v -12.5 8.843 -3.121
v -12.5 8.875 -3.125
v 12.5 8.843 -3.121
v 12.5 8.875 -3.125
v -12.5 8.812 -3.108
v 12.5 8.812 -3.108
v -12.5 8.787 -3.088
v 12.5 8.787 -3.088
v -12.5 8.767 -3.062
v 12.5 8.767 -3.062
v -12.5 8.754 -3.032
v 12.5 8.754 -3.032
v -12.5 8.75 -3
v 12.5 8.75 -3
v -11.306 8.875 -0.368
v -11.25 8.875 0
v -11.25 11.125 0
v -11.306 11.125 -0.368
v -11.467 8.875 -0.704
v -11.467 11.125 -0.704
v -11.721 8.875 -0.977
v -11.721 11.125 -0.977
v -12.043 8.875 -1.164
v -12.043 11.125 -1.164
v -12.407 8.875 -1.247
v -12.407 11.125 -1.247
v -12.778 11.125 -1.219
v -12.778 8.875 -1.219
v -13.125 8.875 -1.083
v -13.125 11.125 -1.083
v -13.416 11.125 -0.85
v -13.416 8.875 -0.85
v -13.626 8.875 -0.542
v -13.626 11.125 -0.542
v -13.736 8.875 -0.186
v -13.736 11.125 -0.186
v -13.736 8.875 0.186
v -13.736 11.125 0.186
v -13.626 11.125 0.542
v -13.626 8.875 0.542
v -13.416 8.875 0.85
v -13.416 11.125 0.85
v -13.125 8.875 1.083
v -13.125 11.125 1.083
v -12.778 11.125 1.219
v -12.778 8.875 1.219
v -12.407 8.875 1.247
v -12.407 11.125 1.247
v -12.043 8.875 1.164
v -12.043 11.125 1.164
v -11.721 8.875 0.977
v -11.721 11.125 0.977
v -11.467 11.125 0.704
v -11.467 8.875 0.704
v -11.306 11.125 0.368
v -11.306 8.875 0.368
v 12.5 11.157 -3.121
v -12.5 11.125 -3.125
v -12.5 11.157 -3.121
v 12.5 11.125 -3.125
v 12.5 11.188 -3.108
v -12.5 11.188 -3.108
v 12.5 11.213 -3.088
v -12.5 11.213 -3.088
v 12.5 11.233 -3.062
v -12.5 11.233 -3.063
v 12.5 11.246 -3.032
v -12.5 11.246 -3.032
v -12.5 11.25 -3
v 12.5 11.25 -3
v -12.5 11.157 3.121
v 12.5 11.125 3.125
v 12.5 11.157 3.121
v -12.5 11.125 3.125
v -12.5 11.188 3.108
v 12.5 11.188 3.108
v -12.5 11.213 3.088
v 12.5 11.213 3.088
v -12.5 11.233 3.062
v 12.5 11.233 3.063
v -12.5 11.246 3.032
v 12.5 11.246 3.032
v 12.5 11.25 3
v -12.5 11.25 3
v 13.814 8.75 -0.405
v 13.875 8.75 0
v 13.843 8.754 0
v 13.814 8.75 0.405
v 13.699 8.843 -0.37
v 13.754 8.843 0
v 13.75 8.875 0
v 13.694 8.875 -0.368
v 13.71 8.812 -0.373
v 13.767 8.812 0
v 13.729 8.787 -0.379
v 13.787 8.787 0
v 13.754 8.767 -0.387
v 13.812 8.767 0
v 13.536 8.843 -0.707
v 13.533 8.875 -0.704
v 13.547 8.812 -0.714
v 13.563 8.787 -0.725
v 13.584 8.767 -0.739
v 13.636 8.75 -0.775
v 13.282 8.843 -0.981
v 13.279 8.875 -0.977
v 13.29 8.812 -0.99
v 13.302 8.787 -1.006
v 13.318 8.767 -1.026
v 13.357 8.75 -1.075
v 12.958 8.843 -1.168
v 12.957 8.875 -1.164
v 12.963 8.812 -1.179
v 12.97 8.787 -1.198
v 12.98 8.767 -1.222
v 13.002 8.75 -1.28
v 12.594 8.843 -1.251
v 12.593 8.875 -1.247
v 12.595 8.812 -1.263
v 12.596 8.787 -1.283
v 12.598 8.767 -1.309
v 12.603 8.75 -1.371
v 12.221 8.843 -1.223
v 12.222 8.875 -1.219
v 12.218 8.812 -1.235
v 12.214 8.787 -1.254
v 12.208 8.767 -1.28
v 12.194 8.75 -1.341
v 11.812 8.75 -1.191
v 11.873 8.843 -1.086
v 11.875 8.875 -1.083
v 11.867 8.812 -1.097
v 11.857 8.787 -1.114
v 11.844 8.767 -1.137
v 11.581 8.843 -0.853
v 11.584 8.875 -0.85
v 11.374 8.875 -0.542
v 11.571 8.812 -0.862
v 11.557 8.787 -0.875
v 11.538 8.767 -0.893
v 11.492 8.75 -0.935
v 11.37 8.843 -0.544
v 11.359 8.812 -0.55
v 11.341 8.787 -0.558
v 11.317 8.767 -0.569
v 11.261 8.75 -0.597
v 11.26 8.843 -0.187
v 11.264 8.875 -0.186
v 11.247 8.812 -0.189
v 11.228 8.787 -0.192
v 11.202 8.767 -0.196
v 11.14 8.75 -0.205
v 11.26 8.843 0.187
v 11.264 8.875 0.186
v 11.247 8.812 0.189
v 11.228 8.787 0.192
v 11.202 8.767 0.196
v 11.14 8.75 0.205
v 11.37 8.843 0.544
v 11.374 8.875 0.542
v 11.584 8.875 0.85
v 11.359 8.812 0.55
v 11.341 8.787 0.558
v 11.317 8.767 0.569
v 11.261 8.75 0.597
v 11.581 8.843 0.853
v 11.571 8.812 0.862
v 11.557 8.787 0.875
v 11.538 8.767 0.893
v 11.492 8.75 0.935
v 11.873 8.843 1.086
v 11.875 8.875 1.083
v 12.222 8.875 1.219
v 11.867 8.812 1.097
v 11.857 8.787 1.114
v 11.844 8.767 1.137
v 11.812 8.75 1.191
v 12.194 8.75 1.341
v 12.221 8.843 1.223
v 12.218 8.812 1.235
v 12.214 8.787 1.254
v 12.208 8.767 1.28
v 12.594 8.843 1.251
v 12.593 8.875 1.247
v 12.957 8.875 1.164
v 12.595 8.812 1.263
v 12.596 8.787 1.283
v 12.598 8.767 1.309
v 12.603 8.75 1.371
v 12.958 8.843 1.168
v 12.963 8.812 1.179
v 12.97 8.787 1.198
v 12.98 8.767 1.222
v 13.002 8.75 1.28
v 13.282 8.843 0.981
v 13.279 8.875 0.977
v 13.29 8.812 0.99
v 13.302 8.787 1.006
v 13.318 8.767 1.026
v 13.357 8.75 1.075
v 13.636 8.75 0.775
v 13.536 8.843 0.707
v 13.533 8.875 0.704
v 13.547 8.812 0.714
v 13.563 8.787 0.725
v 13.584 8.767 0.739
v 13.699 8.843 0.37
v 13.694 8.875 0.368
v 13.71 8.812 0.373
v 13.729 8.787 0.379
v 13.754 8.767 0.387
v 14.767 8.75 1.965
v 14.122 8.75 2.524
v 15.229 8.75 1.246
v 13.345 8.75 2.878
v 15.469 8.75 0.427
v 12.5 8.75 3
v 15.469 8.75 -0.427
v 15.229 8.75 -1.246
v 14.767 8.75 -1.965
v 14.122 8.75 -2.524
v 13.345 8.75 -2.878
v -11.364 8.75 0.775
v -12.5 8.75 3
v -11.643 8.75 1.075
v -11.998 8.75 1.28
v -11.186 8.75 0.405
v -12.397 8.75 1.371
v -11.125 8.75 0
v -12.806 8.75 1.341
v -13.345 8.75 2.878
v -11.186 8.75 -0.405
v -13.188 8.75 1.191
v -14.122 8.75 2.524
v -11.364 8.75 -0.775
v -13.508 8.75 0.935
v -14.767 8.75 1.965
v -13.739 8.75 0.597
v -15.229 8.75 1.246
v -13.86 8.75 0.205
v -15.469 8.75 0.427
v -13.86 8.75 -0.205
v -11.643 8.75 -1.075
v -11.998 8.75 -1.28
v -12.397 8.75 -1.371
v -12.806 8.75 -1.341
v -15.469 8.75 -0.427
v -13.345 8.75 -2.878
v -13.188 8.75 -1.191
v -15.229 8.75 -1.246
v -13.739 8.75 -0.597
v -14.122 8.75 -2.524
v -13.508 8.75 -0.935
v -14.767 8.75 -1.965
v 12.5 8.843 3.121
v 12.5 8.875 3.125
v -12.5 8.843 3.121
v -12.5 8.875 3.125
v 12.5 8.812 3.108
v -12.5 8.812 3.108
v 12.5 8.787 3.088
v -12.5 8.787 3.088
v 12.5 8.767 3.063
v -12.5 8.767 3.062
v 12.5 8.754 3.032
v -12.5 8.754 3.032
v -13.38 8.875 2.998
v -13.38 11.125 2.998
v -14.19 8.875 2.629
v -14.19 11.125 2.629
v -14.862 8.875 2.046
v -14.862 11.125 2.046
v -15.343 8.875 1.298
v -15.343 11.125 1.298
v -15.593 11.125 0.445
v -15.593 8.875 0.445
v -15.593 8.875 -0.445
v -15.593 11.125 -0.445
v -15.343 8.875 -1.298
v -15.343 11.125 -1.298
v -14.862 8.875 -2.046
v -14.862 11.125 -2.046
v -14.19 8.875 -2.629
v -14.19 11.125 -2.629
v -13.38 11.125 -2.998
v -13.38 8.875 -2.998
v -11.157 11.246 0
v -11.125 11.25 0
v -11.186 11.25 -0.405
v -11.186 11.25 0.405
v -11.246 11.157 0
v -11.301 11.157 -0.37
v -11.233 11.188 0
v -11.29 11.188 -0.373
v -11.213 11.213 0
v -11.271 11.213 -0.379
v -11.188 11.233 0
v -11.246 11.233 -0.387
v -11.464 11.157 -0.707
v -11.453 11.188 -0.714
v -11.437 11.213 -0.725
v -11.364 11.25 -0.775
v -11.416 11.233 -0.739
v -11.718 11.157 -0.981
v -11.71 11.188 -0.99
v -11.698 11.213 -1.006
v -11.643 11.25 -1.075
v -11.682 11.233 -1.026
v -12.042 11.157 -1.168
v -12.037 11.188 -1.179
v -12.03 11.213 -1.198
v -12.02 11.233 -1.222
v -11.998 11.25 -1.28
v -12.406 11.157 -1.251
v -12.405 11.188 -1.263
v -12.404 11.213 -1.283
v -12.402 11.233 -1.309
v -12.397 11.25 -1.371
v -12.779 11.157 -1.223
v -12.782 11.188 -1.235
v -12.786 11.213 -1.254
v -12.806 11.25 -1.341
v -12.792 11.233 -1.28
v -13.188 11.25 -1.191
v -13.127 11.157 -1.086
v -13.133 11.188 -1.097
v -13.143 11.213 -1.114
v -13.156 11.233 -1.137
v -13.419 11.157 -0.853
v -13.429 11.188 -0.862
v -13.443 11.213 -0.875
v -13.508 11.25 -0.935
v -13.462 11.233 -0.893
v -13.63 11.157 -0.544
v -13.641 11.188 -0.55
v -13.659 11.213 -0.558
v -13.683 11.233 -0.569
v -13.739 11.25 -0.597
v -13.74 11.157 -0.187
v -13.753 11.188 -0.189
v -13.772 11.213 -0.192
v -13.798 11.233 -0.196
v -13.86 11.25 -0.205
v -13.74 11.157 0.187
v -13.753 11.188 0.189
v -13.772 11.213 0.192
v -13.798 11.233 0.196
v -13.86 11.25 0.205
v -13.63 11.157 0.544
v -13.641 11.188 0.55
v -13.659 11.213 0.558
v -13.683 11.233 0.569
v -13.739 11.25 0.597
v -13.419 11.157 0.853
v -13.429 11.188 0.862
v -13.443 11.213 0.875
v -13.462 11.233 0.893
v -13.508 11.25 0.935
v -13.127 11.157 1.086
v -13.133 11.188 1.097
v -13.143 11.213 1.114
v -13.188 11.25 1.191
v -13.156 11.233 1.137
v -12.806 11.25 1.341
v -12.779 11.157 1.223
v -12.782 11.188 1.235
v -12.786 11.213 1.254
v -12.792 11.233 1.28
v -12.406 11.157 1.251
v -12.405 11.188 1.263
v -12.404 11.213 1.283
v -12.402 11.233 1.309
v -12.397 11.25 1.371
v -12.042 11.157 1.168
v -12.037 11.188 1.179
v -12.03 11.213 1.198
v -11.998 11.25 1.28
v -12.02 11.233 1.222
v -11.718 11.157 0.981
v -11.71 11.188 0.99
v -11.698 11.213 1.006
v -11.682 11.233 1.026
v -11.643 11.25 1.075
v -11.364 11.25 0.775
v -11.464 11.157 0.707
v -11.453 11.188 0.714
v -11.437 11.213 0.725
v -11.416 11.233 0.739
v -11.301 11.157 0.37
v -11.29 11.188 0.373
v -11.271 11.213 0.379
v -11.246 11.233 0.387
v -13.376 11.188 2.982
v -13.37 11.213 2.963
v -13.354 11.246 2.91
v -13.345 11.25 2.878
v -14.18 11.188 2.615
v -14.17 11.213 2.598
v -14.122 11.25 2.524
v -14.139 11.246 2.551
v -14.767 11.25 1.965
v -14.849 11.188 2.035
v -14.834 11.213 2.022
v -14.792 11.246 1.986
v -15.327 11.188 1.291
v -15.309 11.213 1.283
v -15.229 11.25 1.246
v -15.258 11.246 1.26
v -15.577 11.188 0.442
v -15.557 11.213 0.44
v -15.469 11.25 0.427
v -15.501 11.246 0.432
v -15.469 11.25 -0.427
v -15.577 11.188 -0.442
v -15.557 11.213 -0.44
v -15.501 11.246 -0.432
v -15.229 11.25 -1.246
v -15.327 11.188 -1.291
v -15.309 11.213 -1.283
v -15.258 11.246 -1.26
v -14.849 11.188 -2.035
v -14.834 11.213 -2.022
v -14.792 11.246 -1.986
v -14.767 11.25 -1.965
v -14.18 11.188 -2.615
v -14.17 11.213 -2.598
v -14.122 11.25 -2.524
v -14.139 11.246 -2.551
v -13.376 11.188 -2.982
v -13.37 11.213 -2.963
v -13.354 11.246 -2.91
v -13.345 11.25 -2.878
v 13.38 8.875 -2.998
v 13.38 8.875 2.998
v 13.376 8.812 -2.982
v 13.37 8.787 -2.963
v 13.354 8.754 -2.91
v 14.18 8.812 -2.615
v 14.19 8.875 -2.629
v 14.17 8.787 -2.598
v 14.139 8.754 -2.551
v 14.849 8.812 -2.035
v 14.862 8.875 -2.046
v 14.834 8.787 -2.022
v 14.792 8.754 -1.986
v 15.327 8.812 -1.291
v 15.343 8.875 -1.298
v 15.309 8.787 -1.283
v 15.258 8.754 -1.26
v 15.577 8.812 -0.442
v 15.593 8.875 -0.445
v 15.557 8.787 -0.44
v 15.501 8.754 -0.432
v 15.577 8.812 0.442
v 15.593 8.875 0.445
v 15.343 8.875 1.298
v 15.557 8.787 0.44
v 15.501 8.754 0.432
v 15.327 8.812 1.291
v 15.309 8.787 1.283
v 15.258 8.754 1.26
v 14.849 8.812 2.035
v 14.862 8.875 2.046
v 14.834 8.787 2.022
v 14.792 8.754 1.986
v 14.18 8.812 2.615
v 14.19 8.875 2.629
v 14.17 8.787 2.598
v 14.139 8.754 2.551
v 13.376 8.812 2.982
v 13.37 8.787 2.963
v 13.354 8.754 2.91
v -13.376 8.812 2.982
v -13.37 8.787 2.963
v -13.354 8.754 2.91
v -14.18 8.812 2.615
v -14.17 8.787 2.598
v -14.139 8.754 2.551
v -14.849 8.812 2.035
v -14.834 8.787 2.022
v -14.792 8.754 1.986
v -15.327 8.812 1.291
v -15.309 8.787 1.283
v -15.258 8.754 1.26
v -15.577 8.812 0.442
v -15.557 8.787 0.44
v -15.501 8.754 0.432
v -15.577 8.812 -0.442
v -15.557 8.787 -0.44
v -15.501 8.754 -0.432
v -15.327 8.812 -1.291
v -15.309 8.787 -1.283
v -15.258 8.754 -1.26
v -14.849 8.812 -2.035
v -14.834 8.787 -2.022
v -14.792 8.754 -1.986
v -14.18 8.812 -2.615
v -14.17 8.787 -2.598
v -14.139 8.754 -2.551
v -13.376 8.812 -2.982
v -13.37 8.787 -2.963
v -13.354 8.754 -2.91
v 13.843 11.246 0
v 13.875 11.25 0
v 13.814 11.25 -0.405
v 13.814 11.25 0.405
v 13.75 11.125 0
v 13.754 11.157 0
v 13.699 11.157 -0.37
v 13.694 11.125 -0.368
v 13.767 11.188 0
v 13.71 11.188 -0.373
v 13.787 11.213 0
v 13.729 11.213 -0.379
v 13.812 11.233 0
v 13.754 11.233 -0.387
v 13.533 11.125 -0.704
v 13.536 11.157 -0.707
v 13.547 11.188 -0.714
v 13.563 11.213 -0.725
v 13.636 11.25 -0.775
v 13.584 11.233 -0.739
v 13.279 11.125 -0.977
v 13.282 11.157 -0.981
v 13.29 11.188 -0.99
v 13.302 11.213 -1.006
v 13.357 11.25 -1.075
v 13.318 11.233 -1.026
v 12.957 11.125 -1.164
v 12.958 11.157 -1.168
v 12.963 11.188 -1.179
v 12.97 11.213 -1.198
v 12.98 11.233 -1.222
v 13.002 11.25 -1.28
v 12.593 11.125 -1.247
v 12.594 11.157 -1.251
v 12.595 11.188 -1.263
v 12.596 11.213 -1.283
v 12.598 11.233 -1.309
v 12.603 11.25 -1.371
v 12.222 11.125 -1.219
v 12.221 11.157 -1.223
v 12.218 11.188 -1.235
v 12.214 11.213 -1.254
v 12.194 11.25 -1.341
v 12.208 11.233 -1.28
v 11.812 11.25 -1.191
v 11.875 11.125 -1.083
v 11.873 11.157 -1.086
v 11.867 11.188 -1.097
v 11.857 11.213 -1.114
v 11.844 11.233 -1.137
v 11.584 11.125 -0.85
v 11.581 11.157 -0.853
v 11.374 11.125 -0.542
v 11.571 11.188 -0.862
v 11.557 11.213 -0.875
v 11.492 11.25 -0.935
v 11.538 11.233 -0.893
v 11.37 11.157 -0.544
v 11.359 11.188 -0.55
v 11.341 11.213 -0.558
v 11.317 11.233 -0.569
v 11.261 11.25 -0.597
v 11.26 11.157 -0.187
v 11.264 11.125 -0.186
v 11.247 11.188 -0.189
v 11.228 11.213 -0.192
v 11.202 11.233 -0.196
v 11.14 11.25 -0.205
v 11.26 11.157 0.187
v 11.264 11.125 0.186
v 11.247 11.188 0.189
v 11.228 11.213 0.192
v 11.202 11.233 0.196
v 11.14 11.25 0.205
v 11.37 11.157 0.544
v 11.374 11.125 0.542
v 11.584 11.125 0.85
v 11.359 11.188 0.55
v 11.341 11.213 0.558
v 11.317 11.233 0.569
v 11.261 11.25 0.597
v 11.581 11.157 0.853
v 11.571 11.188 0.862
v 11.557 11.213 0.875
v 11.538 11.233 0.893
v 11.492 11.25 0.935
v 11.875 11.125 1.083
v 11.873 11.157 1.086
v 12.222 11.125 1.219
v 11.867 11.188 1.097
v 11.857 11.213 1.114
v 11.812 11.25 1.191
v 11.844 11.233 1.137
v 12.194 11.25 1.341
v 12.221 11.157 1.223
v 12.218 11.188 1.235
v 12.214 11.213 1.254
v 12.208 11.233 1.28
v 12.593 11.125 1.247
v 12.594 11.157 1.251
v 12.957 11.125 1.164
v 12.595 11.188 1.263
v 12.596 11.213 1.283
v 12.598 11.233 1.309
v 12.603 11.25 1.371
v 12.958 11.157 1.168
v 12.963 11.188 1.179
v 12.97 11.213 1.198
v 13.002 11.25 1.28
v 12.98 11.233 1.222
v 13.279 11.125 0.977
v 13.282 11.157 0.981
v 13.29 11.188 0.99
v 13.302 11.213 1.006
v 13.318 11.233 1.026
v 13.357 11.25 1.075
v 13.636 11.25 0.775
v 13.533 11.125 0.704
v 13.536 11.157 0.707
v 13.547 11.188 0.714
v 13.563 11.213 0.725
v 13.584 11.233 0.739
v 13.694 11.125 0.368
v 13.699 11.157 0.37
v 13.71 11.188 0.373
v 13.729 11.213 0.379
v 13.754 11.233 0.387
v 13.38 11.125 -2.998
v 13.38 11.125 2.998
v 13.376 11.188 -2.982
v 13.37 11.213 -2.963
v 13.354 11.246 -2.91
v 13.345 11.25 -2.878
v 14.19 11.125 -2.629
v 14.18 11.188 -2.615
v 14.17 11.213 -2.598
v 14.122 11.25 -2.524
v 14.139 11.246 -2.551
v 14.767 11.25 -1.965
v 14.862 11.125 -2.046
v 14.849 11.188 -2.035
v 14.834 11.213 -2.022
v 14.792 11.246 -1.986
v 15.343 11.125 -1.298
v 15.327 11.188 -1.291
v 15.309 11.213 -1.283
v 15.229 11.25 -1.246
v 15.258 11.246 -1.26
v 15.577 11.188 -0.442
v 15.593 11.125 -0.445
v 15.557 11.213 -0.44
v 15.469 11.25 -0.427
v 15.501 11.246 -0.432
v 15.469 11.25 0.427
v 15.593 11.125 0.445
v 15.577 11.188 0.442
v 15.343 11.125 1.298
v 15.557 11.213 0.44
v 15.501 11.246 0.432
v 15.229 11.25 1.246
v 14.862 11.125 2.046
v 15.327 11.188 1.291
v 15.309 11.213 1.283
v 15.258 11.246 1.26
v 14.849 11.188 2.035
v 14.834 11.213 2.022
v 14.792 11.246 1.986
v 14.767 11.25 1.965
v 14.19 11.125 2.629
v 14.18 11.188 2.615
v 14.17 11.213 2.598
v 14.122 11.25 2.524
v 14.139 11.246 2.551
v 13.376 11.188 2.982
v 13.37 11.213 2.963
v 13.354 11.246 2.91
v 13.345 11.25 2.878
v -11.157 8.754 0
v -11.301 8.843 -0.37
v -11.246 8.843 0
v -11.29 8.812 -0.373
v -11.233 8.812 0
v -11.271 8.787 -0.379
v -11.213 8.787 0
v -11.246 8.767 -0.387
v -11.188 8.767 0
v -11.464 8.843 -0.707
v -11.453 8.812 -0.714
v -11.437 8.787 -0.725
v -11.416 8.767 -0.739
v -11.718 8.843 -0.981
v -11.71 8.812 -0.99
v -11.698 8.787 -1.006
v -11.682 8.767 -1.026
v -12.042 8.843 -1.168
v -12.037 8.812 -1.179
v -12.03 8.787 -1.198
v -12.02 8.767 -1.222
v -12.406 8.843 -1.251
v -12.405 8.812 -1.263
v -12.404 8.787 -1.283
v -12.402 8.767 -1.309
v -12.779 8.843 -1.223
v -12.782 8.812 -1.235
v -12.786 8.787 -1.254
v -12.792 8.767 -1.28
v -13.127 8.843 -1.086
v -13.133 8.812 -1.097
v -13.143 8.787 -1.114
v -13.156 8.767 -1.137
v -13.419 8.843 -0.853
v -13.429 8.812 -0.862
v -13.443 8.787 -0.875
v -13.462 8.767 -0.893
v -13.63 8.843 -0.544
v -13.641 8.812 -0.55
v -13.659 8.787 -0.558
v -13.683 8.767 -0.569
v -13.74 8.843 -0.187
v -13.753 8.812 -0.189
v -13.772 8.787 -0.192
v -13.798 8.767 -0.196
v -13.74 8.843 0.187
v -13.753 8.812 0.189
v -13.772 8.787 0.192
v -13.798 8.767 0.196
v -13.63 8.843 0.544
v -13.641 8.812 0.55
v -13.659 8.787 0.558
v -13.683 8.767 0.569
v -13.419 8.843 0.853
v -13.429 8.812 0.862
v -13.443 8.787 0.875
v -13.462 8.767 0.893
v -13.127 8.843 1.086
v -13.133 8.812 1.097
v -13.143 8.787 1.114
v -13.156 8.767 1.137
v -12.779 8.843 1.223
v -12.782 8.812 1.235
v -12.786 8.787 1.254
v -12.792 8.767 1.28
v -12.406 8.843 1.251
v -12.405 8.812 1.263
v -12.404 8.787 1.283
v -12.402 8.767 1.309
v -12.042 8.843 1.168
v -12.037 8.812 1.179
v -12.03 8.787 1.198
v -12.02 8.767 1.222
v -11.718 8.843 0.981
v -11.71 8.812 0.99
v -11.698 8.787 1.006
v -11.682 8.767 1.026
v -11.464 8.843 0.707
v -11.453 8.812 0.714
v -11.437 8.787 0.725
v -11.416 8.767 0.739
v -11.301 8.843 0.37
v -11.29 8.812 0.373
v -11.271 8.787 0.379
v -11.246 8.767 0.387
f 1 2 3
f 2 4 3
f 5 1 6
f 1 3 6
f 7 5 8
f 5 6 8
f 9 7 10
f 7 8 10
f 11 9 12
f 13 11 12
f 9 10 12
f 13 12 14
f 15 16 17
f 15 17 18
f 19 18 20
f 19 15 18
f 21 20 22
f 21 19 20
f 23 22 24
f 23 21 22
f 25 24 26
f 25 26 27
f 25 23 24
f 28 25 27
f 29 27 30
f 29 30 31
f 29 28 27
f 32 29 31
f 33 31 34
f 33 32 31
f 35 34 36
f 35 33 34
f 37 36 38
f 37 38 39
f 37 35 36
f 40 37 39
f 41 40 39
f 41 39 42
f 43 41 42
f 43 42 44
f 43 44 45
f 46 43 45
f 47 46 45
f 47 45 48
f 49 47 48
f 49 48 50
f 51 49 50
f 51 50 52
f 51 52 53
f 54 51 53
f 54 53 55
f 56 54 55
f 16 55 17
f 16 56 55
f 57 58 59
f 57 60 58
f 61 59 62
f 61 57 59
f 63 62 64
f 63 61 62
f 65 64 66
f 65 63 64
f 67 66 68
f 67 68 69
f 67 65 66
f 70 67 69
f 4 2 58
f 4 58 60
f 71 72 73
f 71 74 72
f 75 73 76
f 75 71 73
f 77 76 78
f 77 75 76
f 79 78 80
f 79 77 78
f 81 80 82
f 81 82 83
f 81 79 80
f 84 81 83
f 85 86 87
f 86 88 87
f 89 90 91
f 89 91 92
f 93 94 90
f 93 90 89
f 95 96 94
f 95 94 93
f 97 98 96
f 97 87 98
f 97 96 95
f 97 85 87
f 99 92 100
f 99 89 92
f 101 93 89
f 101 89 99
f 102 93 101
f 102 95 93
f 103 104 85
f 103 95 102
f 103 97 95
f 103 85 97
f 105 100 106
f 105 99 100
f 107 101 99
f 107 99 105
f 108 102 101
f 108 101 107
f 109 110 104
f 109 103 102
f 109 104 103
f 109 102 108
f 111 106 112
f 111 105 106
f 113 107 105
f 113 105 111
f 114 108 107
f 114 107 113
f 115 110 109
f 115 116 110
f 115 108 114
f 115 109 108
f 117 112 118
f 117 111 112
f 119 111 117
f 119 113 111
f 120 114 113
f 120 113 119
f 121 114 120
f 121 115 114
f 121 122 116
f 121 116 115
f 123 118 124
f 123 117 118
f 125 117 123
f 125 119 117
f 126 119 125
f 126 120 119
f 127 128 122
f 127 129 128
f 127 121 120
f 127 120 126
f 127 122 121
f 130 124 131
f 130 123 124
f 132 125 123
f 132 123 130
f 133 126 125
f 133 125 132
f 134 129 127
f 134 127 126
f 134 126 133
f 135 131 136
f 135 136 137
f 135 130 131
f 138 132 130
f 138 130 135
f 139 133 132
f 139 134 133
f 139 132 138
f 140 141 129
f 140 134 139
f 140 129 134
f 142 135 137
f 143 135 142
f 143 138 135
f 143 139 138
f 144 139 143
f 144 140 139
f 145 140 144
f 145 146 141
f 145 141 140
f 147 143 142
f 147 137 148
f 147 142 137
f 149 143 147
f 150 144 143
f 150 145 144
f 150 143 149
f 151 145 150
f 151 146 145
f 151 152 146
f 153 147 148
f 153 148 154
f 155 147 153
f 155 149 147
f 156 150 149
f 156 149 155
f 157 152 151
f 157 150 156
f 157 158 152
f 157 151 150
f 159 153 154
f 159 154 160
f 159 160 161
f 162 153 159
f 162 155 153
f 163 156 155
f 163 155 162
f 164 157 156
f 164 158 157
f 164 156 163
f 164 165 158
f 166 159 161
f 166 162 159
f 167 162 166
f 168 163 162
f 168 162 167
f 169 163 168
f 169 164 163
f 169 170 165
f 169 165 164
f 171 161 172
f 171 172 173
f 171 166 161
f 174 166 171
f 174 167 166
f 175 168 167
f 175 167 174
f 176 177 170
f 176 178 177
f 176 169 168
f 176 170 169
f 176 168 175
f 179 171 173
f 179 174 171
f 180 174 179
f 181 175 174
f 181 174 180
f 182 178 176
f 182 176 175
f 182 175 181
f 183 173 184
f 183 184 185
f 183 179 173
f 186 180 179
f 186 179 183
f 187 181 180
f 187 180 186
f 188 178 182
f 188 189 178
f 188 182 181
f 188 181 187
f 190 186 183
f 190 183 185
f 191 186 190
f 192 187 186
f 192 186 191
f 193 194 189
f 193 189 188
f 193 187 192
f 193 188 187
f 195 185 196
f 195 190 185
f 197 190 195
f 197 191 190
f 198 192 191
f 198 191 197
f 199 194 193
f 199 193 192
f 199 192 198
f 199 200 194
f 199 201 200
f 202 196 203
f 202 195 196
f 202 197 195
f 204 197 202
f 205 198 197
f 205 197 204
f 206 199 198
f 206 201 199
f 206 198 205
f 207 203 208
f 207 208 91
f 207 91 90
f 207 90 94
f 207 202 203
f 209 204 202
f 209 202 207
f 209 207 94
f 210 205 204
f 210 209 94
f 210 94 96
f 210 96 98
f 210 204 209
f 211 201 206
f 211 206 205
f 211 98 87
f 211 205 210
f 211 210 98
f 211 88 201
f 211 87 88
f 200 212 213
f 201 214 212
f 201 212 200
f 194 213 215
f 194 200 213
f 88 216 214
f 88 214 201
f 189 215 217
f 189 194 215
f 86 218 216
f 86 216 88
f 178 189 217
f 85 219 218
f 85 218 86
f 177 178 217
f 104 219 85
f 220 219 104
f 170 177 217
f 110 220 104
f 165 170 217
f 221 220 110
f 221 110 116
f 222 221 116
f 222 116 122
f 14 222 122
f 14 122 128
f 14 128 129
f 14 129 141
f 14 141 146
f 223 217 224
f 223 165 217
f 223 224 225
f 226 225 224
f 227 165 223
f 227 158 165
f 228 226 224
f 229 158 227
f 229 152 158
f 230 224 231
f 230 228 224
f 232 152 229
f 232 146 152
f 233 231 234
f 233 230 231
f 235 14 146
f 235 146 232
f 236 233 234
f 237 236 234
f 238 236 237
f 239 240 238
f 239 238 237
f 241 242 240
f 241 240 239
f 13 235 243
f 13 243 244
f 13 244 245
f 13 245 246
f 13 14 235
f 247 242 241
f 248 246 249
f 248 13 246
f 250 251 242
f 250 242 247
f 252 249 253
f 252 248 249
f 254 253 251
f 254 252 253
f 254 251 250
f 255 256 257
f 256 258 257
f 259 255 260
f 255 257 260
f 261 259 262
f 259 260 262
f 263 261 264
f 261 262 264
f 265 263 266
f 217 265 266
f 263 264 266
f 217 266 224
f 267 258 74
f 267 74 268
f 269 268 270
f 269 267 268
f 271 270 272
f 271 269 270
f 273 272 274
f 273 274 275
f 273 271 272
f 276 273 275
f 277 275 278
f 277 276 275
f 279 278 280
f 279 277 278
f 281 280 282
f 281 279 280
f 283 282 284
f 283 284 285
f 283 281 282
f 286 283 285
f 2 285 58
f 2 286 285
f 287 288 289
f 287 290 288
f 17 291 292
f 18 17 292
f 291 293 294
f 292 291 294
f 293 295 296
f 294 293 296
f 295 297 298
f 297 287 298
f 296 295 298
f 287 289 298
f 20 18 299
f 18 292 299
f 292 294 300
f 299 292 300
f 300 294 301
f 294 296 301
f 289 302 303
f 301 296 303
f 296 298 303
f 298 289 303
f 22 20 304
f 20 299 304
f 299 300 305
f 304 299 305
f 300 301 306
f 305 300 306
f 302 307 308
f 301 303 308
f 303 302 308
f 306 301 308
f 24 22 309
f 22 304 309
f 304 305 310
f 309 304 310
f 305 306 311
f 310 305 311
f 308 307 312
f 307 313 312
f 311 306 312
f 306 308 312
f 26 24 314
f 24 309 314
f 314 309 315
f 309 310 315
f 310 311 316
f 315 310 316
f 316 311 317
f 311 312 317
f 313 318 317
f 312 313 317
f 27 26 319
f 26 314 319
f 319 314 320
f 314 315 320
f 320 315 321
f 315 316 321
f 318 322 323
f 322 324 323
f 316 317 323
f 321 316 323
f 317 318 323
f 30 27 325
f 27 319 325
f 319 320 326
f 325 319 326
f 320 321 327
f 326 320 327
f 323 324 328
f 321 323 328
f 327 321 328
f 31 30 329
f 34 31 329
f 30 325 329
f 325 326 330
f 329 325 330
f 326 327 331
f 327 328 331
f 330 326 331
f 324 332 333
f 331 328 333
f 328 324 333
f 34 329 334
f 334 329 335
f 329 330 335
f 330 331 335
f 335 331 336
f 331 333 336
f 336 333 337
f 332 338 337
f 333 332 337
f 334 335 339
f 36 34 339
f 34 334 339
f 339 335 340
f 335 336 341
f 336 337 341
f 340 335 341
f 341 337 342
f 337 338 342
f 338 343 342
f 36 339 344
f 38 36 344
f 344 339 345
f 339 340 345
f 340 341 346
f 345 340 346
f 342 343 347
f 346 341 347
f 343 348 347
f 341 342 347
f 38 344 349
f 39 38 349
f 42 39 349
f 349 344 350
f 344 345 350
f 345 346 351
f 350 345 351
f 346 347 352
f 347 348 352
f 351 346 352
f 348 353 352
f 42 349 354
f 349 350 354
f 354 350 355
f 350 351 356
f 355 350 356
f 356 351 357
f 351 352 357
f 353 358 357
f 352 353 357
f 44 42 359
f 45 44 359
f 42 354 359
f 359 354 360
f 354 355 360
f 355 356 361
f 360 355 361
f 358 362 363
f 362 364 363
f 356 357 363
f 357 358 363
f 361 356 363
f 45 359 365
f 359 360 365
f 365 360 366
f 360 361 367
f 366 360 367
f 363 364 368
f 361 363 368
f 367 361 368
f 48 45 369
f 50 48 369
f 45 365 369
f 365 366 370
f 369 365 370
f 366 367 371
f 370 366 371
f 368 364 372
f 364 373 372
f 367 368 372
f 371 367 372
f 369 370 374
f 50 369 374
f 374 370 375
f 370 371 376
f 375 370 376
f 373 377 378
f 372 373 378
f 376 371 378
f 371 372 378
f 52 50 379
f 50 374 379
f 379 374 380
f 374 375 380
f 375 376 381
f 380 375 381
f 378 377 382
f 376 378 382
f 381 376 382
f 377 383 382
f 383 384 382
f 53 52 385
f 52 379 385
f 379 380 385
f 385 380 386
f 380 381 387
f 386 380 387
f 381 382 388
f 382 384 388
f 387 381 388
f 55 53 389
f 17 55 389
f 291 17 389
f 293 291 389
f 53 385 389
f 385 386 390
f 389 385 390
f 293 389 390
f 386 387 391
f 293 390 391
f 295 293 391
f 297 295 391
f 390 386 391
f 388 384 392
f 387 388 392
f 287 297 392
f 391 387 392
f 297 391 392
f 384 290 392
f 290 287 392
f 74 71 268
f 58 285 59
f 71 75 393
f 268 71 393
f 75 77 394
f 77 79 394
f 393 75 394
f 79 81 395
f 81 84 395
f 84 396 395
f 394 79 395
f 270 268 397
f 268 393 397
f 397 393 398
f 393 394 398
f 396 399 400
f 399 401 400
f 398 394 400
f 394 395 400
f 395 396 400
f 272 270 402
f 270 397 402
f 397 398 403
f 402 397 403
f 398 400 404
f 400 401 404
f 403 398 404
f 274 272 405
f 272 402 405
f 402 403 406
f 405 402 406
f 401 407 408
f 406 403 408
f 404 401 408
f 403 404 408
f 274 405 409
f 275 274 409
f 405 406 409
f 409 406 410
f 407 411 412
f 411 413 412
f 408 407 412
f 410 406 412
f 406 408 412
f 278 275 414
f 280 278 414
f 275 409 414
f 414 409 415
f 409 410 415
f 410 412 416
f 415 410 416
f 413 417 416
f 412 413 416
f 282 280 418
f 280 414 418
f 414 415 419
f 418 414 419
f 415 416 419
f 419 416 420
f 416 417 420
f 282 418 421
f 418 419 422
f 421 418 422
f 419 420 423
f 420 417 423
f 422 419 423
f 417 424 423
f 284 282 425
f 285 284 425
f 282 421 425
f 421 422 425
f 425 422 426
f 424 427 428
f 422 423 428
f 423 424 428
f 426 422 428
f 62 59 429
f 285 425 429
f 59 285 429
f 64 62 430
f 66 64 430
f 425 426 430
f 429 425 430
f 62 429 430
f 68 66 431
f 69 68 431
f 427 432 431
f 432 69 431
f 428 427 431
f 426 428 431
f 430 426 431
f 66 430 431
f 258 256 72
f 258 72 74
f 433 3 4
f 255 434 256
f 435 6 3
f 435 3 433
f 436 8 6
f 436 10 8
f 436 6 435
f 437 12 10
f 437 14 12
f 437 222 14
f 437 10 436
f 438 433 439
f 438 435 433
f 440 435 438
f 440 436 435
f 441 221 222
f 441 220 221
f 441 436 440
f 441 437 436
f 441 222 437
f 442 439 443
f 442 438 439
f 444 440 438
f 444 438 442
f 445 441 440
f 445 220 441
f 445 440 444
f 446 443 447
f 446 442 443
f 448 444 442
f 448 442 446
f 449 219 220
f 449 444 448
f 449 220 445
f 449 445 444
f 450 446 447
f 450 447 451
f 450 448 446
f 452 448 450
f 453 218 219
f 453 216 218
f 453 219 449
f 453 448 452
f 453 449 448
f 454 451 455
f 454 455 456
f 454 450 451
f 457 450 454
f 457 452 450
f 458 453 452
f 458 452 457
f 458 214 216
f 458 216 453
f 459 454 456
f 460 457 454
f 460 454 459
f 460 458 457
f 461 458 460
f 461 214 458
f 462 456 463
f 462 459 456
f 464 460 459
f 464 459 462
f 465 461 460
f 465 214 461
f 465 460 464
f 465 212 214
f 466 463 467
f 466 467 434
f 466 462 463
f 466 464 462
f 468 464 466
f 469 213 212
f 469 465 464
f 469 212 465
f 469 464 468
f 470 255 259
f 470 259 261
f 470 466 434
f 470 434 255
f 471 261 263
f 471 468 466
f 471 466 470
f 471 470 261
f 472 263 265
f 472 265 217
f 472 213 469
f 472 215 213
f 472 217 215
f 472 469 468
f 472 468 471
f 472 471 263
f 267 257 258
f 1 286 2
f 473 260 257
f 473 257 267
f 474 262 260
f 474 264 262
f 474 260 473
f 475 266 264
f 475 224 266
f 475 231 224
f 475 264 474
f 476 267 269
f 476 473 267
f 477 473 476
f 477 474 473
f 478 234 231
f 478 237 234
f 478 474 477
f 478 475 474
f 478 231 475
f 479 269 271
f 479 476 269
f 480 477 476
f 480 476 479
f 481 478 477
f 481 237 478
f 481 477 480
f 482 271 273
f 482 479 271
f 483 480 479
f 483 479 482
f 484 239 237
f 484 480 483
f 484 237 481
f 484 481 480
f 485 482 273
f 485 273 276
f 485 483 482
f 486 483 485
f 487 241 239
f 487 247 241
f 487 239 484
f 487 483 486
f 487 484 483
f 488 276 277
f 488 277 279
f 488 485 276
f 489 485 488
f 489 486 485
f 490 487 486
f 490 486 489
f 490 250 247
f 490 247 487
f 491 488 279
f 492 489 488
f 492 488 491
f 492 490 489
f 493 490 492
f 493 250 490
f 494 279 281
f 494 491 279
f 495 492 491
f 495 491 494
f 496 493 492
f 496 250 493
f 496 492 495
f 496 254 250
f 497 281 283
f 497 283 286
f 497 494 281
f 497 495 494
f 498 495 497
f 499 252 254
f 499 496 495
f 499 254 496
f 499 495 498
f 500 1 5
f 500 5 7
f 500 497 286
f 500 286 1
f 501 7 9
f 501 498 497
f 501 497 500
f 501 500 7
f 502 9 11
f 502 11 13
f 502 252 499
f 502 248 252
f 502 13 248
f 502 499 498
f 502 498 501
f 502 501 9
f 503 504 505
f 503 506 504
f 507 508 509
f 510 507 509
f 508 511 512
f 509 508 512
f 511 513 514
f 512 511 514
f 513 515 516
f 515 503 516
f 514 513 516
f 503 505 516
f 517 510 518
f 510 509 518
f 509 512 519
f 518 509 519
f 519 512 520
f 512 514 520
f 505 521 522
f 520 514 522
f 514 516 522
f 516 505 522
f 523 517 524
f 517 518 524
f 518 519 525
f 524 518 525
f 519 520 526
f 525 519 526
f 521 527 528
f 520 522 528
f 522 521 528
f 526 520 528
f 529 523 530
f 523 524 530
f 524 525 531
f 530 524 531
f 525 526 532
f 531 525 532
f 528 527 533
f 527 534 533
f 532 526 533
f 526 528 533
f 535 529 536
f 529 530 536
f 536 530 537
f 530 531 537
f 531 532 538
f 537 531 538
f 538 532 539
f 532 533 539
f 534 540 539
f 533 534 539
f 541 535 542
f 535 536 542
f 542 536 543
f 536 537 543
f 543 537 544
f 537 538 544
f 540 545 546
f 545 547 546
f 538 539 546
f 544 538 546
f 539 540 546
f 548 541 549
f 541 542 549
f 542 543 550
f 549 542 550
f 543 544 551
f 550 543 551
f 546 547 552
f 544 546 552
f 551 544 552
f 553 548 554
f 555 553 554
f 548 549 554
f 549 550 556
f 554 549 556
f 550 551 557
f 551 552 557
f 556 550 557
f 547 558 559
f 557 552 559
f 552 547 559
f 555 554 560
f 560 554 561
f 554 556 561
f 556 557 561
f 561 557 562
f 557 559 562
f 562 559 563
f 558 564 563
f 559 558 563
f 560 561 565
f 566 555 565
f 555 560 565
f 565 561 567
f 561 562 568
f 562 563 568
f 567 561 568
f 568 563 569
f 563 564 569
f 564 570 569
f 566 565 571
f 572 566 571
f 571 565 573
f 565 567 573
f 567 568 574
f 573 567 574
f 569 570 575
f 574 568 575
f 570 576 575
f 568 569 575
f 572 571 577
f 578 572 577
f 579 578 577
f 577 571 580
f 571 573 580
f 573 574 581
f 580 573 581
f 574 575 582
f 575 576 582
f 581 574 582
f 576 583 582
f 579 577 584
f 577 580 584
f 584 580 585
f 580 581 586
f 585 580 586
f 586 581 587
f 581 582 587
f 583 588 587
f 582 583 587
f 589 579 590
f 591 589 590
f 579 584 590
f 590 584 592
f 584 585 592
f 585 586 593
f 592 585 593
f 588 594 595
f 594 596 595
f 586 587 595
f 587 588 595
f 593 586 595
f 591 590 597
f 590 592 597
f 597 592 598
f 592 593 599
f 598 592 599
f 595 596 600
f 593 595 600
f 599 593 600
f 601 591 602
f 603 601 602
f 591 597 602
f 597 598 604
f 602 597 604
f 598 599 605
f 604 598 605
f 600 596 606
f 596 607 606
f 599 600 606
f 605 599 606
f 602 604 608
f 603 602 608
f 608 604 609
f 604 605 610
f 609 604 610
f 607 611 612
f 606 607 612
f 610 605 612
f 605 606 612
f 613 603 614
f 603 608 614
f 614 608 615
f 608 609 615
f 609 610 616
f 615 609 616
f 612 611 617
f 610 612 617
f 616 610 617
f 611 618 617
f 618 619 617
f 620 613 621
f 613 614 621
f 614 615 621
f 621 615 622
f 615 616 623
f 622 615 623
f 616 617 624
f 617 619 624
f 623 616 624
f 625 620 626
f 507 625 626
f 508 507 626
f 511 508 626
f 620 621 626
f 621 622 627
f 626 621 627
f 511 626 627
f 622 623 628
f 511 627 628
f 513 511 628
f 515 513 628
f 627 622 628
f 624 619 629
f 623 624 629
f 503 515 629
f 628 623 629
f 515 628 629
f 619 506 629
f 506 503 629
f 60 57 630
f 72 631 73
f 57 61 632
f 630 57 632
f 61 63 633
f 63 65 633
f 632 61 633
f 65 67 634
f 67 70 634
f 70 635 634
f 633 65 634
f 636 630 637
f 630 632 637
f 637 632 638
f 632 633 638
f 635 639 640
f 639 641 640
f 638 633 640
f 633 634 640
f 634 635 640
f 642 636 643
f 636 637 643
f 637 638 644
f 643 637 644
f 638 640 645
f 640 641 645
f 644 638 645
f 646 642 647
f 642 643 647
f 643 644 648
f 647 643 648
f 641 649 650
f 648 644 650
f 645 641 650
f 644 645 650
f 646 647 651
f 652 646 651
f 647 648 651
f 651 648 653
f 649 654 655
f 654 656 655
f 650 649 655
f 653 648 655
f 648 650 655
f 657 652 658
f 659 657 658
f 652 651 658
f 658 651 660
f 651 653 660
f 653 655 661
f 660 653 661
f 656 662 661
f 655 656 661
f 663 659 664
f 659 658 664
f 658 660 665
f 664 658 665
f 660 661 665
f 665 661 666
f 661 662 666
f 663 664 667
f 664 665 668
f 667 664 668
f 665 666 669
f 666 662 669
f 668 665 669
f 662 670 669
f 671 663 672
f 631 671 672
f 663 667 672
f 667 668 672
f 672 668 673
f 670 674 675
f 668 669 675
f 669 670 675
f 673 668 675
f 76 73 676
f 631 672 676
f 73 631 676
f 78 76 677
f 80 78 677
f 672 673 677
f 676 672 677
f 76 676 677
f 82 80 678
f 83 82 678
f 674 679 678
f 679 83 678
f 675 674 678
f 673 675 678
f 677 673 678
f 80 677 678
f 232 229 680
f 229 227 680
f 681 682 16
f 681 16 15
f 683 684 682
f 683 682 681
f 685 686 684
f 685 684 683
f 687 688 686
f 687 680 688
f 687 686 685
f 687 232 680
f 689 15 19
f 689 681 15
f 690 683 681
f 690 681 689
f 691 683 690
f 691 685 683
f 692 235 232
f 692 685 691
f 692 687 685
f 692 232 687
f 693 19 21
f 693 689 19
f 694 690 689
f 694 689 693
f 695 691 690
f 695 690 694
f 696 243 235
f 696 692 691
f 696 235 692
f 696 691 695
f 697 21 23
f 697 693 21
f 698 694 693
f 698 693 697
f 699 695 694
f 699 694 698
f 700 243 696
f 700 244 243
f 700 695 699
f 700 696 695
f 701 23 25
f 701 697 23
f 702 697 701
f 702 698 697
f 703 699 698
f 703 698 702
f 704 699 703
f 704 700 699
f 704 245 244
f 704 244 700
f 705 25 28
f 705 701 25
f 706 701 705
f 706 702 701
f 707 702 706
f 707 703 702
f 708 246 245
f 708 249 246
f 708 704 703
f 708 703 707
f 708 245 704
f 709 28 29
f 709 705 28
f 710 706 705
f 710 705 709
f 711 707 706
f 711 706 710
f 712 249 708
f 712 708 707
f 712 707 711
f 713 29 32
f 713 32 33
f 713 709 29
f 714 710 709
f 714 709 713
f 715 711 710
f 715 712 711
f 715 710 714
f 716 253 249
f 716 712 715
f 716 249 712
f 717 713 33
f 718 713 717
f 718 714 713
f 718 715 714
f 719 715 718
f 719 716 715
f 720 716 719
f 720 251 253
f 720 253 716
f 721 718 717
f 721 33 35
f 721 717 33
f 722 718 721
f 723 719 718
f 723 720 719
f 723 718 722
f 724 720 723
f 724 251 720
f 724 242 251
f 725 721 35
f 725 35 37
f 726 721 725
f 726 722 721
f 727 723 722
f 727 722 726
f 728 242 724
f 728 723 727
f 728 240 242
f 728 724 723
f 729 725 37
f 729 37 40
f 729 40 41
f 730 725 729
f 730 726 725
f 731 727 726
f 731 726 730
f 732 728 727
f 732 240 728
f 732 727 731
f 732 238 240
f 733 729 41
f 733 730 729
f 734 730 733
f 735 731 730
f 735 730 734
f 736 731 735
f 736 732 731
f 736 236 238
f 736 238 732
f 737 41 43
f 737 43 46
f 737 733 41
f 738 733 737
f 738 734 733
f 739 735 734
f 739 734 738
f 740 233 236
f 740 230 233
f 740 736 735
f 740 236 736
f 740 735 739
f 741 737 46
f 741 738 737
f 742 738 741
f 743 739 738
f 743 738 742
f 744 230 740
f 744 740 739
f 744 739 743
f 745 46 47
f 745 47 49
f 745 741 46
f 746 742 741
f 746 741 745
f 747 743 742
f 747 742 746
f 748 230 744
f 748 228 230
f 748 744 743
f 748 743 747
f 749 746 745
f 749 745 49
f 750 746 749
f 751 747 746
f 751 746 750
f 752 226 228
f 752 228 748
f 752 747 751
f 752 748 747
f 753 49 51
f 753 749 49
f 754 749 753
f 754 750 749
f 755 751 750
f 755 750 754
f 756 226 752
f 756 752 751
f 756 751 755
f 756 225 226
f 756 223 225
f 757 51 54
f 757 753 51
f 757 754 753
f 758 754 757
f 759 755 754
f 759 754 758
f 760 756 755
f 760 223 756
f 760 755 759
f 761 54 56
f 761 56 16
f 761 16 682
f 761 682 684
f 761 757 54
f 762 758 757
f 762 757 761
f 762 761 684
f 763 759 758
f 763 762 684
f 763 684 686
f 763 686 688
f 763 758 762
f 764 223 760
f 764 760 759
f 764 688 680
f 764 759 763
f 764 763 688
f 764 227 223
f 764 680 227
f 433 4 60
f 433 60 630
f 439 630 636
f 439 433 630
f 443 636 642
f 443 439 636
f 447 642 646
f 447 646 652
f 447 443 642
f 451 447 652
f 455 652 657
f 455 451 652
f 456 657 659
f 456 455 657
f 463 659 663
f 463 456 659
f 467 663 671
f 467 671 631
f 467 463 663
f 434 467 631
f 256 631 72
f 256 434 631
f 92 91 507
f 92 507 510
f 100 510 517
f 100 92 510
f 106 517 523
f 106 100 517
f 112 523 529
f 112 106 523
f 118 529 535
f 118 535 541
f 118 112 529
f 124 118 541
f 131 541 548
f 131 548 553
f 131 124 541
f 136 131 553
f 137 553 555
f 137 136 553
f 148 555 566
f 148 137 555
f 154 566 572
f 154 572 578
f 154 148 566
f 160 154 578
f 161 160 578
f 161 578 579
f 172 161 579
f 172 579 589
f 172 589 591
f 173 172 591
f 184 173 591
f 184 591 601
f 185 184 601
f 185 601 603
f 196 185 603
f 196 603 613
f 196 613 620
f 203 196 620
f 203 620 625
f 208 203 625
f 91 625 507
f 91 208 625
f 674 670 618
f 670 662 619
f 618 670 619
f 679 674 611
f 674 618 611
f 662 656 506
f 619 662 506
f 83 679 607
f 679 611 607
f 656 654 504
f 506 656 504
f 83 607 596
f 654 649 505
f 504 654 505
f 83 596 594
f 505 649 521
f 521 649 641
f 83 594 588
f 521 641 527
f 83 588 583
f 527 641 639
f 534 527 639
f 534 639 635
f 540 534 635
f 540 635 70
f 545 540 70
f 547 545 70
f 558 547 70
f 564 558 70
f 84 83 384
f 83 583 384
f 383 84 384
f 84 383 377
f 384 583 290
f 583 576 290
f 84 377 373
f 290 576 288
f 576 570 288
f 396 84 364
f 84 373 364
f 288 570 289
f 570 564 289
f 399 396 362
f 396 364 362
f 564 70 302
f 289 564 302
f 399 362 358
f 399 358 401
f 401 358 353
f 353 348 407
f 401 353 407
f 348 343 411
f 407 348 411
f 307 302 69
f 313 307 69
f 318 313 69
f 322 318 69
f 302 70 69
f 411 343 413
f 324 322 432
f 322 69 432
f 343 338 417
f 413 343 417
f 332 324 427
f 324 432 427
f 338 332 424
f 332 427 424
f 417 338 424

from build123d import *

# Parameters (mm, degrees)
SKETCH1_R           = 10
BOSS_EXTRUDE1_DEPTH = 20
FILLET1_R           = 1
SCALE1_SCALE        = 0.125


with BuildPart() as part:
    # Sketch1 → Boss-Extrude1 (new body)
    with BuildSketch(Plane(origin=(0, 0, 0), x_dir=(1, 0, 0), z_dir=(0, 1, 0))):
        with BuildLine():
            Line((-100, 25), (100, 25))
            ThreePointArc((100, 25), (125, 0), (100, -25))
            Line((100, -25), (-100, -25))
            ThreePointArc((-100, -25), (-125, 0), (-100, 25))
        make_face()
        with Locations((-100, 0)):
            Circle(SKETCH1_R, mode=Mode.SUBTRACT)
        with Locations((100, 0)):
            Circle(SKETCH1_R, mode=Mode.SUBTRACT)
    extrude(amount=BOSS_EXTRUDE1_DEPTH)

    # Fillet1
    fillet1_edges = [part.edges().sort_by_distance(p)[0] for p in [
        (-110, 0, 0),
        (-110, 20, 0),
        (125, 20, 0),
        (90, 0, 0),
        (90, 20, 0),
        (0, 20, -25),
        (-125, 20, 0),
        (0, 0, -25),
        (125, 0, 0),
        (0, 0, 25),
        (-125, 0, 0),
        (0, 20, 25),
    ]]
    fillet(fillet1_edges, radius=FILLET1_R)


with BuildPart() as part_1:
    # Scale1: scaled about (0, 10, 0)
    add(part.part.scale(SCALE1_SCALE).moved(Location((0, 8.75, 0))))


solid = part_1.part
